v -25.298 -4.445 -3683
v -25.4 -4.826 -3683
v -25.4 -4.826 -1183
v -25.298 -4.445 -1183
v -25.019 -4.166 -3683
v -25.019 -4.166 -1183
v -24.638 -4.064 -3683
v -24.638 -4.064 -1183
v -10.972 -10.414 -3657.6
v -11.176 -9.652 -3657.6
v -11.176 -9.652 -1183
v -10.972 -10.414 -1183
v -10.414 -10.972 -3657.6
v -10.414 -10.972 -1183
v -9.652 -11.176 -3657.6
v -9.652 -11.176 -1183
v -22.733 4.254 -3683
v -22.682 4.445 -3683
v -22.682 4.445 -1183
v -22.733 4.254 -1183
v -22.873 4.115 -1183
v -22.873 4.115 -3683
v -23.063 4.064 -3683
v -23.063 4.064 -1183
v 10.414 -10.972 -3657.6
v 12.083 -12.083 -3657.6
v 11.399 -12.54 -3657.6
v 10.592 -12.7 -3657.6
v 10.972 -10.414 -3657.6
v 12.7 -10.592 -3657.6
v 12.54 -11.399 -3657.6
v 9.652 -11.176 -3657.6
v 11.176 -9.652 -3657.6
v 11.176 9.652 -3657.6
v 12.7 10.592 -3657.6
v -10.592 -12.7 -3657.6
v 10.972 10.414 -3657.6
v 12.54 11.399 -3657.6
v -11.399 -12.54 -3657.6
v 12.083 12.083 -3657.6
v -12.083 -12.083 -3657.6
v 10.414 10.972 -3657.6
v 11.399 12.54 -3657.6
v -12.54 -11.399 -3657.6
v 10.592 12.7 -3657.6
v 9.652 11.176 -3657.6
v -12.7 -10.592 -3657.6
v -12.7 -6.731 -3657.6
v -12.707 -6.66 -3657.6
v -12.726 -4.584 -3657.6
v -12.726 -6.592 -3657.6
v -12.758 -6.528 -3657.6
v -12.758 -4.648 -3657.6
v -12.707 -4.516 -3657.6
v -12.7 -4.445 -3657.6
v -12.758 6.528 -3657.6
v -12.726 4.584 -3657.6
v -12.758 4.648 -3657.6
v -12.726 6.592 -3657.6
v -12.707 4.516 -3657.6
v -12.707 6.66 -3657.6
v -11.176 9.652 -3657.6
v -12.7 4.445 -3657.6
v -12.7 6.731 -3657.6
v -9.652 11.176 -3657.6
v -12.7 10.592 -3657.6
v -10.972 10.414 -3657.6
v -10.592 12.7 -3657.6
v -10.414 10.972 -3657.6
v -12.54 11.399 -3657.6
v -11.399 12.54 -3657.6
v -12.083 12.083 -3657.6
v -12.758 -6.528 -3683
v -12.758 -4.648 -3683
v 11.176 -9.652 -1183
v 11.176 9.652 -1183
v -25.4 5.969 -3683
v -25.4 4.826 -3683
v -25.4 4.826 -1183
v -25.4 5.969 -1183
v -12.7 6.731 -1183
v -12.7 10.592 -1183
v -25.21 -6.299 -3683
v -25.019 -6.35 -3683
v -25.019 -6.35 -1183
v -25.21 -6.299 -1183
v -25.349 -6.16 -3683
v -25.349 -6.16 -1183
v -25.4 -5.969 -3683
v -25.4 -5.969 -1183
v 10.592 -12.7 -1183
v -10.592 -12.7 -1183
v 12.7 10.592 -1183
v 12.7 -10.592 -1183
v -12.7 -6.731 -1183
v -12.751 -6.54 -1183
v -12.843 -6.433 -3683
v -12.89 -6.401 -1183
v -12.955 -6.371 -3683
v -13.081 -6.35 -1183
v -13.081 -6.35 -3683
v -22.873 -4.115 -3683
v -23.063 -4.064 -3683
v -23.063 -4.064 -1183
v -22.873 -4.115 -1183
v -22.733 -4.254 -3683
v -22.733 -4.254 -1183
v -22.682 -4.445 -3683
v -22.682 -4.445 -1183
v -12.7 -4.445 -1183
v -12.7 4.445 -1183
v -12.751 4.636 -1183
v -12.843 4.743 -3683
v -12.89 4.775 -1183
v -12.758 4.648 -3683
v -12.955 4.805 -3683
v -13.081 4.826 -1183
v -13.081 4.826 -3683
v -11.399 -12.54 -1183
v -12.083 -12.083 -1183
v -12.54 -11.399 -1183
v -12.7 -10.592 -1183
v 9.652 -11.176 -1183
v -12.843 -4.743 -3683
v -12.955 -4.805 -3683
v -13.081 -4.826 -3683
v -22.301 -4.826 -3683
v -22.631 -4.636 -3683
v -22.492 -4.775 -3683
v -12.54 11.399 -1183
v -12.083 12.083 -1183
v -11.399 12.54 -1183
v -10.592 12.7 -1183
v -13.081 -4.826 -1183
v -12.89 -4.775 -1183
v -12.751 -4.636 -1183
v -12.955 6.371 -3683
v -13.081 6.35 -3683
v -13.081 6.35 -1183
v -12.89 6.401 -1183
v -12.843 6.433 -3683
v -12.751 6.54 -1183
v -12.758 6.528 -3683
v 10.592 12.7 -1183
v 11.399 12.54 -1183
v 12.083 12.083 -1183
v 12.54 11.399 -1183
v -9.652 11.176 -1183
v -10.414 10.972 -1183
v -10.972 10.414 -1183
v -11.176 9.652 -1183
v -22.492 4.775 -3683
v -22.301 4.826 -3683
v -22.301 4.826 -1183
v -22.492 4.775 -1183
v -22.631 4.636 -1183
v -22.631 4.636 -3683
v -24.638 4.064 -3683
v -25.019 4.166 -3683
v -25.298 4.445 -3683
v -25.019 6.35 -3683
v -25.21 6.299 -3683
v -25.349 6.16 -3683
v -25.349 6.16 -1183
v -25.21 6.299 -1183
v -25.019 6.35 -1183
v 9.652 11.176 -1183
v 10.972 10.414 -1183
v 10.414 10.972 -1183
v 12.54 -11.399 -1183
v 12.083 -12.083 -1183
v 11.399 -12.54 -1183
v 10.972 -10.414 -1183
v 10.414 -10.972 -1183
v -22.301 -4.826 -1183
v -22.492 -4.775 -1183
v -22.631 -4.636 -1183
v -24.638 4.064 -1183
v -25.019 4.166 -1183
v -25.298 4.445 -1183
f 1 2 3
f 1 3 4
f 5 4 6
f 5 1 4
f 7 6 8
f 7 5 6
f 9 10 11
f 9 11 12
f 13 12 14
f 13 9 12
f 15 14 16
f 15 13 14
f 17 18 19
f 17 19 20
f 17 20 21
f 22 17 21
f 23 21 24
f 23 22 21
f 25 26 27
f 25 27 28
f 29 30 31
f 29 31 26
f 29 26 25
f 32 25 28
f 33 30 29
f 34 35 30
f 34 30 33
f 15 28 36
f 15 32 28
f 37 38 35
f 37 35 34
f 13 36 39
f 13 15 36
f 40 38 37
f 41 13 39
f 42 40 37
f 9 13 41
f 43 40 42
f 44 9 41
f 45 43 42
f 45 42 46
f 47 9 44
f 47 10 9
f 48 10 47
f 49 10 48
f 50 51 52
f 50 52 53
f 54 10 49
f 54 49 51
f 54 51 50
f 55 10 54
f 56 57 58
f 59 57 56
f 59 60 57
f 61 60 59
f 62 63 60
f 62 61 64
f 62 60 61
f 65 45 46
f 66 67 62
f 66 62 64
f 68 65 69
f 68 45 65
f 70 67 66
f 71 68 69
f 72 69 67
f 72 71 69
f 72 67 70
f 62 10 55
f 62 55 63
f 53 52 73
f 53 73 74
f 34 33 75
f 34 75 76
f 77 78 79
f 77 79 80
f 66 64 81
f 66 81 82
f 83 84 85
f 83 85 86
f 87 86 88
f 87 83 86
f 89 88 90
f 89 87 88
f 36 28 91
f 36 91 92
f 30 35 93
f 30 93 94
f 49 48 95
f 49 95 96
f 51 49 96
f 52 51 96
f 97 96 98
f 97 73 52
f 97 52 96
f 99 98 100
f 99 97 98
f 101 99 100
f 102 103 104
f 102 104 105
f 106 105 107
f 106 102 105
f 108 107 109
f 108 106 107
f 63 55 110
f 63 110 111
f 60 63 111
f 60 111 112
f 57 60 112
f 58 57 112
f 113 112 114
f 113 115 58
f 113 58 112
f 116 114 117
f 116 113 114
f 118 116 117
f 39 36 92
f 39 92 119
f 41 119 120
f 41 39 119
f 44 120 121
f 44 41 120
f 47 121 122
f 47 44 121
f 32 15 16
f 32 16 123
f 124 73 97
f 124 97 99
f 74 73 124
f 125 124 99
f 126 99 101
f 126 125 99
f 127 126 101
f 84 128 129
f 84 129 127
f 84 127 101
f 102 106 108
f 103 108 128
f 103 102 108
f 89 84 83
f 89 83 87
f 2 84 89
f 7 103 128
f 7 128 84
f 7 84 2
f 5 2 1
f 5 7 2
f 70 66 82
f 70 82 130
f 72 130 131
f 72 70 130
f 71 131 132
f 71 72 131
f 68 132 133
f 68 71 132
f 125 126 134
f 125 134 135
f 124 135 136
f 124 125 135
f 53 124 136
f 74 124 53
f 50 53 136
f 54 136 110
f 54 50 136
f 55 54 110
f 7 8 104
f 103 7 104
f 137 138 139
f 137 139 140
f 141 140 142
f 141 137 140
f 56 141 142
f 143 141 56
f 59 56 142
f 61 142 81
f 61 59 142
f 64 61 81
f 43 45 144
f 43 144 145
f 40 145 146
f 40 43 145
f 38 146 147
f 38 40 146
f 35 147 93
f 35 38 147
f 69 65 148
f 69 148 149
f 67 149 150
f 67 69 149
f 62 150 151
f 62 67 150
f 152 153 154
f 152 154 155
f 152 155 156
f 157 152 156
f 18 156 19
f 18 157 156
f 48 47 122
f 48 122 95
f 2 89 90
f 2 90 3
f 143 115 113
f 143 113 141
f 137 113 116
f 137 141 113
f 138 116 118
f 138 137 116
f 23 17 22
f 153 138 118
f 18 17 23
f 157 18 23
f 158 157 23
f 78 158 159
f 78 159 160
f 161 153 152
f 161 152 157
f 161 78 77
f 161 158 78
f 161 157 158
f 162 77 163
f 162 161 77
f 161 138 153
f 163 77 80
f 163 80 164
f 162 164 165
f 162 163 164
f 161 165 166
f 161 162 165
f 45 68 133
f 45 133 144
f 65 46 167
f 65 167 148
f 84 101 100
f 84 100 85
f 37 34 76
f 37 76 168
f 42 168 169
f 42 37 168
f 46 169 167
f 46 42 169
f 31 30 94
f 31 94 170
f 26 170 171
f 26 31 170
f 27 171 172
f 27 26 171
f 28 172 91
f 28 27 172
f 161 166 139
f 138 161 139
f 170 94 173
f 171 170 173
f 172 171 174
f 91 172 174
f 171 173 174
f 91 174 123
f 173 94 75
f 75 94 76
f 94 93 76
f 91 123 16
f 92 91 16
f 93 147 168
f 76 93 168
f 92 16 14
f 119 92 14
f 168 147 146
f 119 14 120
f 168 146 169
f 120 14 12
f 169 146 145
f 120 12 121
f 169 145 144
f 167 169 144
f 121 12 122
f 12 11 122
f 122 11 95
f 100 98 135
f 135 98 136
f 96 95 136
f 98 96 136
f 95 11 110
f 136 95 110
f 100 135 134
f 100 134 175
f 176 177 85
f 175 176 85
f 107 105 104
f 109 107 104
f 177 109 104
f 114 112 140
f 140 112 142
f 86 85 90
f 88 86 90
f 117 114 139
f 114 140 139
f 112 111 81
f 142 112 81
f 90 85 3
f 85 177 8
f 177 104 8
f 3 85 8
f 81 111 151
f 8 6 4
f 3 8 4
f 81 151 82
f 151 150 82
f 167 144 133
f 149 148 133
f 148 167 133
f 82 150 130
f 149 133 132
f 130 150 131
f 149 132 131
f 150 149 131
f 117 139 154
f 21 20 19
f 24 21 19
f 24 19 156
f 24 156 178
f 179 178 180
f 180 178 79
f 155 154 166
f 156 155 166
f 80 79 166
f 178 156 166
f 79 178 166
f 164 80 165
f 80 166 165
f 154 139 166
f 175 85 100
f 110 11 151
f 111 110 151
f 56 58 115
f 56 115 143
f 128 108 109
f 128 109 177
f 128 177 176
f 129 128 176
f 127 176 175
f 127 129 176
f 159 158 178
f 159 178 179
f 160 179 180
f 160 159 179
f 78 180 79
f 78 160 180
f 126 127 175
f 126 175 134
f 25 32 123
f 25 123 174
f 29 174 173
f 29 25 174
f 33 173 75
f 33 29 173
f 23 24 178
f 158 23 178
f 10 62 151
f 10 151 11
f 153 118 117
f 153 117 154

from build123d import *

# Parameters (mm, degrees)
BOSS_EXTRUDE1_DEPTH = 2500
CUT_EXTRUDE2_DEPTH  = 25.4


with BuildPart() as part:
    # Sketch1 → Boss-Extrude1 (new body)
    with BuildSketch(Plane(origin=(0, 0, -3683), x_dir=(-1, 0, 0), z_dir=(0, 0, -1))):
        with BuildLine():
            Line((25.4, -5.969), (25.4, -4.826))
            ThreePointArc((25.4, -4.826), (25.176815367, -4.287184633), (24.638, -4.064))
            Line((24.638, -4.064), (23.0632, -4.064))
            ThreePointArc((23.0632, -4.064), (22.793792316, -4.175592316), (22.6822, -4.445))
            ThreePointArc((22.6822, -4.445), (22.570607684, -4.714407684), (22.3012, -4.826))
            Line((22.3012, -4.826), (13.081, -4.826))
            ThreePointArc((13.081, -4.826), (12.811592316, -4.714407684), (12.7, -4.445))
            Line((12.7, -4.445), (12.7, 4.445))
            ThreePointArc((12.7, 4.445), (12.811592316, 4.714407684), (13.081, 4.826))
            Line((13.081, 4.826), (22.3012, 4.826))
            ThreePointArc((22.3012, 4.826), (22.570607684, 4.714407684), (22.6822, 4.445))
            ThreePointArc((22.6822, 4.445), (22.793792316, 4.175592316), (23.0632, 4.064))
            Line((23.0632, 4.064), (24.638, 4.064))
            ThreePointArc((24.638, 4.064), (25.176815367, 4.287184633), (25.4, 4.826))
            Line((25.4, 4.826), (25.4, 5.969))
            ThreePointArc((25.4, 5.969), (25.288407684, 6.238407684), (25.019, 6.35))
            Line((25.019, 6.35), (13.081, 6.35))
            ThreePointArc((13.081, 6.35), (12.811592316, 6.461592316), (12.7, 6.731))
            Line((12.7, 6.731), (12.7, 10.5918))
            ThreePointArc((12.7, 10.5918), (12.082522516, 12.082522516), (10.5918, 12.7))
            Line((10.5918, 12.7), (-10.5918, 12.7))
            ThreePointArc((-10.5918, 12.7), (-12.082522516, 12.082522516), (-12.7, 10.5918))
            Line((-12.7, 10.5918), (-12.7, -10.5918))
            ThreePointArc((-12.7, -10.5918), (-12.082522516, -12.082522516), (-10.5918, -12.7))
            Line((-10.5918, -12.7), (10.5918, -12.7))
            ThreePointArc((10.5918, -12.7), (12.082522516, -12.082522516), (12.7, -10.5918))
            Line((12.7, -10.5918), (12.7, -6.731))
            ThreePointArc((12.7, -6.731), (12.811592316, -6.461592316), (13.081, -6.35))
            Line((13.081, -6.35), (25.019, -6.35))
            ThreePointArc((25.019, -6.35), (25.288407684, -6.238407684), (25.4, -5.969))
        make_face()
        with BuildLine():
            Line((11.176, 9.652), (11.176, -9.652))
            ThreePointArc((11.176, -9.652), (10.729630735, -10.729630735), (9.652, -11.176))
            Line((9.652, -11.176), (-9.652, -11.176))
            ThreePointArc((-9.652, -11.176), (-10.729630735, -10.729630735), (-11.176, -9.652))
            Line((-11.176, -9.652), (-11.176, 9.652))
            ThreePointArc((-11.176, 9.652), (-10.729630735, 10.729630735), (-9.652, 11.176))
            Line((-9.652, 11.176), (9.652, 11.176))
            ThreePointArc((9.652, 11.176), (10.729630735, 10.729630735), (11.176, 9.652))
        make_face(mode=Mode.SUBTRACT)
    extrude(amount=-BOSS_EXTRUDE1_DEPTH)

    # Sketch2 → Cut-Extrude2 (cut)
    with BuildSketch(Plane(origin=(0, 0, -3683), x_dir=(-1, 0, 0), z_dir=(0, 0, -1))):
        with BuildLine():
            Line((12.758304506, -12.7), (12.758304506, 12.7))
            Line((12.758304506, 12.7), (10.5918, 12.7))
            Line((10.5918, 12.7), (-10.5918, 12.7))
            ThreePointArc((-10.5918, 12.7), (-12.082522516, 12.082522516), (-12.7, 10.5918))
            Line((-12.7, 10.5918), (-12.7, -12.909808873))
            Line((-12.7, -12.909808873), (-10.5918, -12.7))
            Line((-10.5918, -12.7), (12.758304506, -12.7))
        make_face()
    extrude(amount=-CUT_EXTRUDE2_DEPTH, mode=Mode.SUBTRACT)


solid = part.part
